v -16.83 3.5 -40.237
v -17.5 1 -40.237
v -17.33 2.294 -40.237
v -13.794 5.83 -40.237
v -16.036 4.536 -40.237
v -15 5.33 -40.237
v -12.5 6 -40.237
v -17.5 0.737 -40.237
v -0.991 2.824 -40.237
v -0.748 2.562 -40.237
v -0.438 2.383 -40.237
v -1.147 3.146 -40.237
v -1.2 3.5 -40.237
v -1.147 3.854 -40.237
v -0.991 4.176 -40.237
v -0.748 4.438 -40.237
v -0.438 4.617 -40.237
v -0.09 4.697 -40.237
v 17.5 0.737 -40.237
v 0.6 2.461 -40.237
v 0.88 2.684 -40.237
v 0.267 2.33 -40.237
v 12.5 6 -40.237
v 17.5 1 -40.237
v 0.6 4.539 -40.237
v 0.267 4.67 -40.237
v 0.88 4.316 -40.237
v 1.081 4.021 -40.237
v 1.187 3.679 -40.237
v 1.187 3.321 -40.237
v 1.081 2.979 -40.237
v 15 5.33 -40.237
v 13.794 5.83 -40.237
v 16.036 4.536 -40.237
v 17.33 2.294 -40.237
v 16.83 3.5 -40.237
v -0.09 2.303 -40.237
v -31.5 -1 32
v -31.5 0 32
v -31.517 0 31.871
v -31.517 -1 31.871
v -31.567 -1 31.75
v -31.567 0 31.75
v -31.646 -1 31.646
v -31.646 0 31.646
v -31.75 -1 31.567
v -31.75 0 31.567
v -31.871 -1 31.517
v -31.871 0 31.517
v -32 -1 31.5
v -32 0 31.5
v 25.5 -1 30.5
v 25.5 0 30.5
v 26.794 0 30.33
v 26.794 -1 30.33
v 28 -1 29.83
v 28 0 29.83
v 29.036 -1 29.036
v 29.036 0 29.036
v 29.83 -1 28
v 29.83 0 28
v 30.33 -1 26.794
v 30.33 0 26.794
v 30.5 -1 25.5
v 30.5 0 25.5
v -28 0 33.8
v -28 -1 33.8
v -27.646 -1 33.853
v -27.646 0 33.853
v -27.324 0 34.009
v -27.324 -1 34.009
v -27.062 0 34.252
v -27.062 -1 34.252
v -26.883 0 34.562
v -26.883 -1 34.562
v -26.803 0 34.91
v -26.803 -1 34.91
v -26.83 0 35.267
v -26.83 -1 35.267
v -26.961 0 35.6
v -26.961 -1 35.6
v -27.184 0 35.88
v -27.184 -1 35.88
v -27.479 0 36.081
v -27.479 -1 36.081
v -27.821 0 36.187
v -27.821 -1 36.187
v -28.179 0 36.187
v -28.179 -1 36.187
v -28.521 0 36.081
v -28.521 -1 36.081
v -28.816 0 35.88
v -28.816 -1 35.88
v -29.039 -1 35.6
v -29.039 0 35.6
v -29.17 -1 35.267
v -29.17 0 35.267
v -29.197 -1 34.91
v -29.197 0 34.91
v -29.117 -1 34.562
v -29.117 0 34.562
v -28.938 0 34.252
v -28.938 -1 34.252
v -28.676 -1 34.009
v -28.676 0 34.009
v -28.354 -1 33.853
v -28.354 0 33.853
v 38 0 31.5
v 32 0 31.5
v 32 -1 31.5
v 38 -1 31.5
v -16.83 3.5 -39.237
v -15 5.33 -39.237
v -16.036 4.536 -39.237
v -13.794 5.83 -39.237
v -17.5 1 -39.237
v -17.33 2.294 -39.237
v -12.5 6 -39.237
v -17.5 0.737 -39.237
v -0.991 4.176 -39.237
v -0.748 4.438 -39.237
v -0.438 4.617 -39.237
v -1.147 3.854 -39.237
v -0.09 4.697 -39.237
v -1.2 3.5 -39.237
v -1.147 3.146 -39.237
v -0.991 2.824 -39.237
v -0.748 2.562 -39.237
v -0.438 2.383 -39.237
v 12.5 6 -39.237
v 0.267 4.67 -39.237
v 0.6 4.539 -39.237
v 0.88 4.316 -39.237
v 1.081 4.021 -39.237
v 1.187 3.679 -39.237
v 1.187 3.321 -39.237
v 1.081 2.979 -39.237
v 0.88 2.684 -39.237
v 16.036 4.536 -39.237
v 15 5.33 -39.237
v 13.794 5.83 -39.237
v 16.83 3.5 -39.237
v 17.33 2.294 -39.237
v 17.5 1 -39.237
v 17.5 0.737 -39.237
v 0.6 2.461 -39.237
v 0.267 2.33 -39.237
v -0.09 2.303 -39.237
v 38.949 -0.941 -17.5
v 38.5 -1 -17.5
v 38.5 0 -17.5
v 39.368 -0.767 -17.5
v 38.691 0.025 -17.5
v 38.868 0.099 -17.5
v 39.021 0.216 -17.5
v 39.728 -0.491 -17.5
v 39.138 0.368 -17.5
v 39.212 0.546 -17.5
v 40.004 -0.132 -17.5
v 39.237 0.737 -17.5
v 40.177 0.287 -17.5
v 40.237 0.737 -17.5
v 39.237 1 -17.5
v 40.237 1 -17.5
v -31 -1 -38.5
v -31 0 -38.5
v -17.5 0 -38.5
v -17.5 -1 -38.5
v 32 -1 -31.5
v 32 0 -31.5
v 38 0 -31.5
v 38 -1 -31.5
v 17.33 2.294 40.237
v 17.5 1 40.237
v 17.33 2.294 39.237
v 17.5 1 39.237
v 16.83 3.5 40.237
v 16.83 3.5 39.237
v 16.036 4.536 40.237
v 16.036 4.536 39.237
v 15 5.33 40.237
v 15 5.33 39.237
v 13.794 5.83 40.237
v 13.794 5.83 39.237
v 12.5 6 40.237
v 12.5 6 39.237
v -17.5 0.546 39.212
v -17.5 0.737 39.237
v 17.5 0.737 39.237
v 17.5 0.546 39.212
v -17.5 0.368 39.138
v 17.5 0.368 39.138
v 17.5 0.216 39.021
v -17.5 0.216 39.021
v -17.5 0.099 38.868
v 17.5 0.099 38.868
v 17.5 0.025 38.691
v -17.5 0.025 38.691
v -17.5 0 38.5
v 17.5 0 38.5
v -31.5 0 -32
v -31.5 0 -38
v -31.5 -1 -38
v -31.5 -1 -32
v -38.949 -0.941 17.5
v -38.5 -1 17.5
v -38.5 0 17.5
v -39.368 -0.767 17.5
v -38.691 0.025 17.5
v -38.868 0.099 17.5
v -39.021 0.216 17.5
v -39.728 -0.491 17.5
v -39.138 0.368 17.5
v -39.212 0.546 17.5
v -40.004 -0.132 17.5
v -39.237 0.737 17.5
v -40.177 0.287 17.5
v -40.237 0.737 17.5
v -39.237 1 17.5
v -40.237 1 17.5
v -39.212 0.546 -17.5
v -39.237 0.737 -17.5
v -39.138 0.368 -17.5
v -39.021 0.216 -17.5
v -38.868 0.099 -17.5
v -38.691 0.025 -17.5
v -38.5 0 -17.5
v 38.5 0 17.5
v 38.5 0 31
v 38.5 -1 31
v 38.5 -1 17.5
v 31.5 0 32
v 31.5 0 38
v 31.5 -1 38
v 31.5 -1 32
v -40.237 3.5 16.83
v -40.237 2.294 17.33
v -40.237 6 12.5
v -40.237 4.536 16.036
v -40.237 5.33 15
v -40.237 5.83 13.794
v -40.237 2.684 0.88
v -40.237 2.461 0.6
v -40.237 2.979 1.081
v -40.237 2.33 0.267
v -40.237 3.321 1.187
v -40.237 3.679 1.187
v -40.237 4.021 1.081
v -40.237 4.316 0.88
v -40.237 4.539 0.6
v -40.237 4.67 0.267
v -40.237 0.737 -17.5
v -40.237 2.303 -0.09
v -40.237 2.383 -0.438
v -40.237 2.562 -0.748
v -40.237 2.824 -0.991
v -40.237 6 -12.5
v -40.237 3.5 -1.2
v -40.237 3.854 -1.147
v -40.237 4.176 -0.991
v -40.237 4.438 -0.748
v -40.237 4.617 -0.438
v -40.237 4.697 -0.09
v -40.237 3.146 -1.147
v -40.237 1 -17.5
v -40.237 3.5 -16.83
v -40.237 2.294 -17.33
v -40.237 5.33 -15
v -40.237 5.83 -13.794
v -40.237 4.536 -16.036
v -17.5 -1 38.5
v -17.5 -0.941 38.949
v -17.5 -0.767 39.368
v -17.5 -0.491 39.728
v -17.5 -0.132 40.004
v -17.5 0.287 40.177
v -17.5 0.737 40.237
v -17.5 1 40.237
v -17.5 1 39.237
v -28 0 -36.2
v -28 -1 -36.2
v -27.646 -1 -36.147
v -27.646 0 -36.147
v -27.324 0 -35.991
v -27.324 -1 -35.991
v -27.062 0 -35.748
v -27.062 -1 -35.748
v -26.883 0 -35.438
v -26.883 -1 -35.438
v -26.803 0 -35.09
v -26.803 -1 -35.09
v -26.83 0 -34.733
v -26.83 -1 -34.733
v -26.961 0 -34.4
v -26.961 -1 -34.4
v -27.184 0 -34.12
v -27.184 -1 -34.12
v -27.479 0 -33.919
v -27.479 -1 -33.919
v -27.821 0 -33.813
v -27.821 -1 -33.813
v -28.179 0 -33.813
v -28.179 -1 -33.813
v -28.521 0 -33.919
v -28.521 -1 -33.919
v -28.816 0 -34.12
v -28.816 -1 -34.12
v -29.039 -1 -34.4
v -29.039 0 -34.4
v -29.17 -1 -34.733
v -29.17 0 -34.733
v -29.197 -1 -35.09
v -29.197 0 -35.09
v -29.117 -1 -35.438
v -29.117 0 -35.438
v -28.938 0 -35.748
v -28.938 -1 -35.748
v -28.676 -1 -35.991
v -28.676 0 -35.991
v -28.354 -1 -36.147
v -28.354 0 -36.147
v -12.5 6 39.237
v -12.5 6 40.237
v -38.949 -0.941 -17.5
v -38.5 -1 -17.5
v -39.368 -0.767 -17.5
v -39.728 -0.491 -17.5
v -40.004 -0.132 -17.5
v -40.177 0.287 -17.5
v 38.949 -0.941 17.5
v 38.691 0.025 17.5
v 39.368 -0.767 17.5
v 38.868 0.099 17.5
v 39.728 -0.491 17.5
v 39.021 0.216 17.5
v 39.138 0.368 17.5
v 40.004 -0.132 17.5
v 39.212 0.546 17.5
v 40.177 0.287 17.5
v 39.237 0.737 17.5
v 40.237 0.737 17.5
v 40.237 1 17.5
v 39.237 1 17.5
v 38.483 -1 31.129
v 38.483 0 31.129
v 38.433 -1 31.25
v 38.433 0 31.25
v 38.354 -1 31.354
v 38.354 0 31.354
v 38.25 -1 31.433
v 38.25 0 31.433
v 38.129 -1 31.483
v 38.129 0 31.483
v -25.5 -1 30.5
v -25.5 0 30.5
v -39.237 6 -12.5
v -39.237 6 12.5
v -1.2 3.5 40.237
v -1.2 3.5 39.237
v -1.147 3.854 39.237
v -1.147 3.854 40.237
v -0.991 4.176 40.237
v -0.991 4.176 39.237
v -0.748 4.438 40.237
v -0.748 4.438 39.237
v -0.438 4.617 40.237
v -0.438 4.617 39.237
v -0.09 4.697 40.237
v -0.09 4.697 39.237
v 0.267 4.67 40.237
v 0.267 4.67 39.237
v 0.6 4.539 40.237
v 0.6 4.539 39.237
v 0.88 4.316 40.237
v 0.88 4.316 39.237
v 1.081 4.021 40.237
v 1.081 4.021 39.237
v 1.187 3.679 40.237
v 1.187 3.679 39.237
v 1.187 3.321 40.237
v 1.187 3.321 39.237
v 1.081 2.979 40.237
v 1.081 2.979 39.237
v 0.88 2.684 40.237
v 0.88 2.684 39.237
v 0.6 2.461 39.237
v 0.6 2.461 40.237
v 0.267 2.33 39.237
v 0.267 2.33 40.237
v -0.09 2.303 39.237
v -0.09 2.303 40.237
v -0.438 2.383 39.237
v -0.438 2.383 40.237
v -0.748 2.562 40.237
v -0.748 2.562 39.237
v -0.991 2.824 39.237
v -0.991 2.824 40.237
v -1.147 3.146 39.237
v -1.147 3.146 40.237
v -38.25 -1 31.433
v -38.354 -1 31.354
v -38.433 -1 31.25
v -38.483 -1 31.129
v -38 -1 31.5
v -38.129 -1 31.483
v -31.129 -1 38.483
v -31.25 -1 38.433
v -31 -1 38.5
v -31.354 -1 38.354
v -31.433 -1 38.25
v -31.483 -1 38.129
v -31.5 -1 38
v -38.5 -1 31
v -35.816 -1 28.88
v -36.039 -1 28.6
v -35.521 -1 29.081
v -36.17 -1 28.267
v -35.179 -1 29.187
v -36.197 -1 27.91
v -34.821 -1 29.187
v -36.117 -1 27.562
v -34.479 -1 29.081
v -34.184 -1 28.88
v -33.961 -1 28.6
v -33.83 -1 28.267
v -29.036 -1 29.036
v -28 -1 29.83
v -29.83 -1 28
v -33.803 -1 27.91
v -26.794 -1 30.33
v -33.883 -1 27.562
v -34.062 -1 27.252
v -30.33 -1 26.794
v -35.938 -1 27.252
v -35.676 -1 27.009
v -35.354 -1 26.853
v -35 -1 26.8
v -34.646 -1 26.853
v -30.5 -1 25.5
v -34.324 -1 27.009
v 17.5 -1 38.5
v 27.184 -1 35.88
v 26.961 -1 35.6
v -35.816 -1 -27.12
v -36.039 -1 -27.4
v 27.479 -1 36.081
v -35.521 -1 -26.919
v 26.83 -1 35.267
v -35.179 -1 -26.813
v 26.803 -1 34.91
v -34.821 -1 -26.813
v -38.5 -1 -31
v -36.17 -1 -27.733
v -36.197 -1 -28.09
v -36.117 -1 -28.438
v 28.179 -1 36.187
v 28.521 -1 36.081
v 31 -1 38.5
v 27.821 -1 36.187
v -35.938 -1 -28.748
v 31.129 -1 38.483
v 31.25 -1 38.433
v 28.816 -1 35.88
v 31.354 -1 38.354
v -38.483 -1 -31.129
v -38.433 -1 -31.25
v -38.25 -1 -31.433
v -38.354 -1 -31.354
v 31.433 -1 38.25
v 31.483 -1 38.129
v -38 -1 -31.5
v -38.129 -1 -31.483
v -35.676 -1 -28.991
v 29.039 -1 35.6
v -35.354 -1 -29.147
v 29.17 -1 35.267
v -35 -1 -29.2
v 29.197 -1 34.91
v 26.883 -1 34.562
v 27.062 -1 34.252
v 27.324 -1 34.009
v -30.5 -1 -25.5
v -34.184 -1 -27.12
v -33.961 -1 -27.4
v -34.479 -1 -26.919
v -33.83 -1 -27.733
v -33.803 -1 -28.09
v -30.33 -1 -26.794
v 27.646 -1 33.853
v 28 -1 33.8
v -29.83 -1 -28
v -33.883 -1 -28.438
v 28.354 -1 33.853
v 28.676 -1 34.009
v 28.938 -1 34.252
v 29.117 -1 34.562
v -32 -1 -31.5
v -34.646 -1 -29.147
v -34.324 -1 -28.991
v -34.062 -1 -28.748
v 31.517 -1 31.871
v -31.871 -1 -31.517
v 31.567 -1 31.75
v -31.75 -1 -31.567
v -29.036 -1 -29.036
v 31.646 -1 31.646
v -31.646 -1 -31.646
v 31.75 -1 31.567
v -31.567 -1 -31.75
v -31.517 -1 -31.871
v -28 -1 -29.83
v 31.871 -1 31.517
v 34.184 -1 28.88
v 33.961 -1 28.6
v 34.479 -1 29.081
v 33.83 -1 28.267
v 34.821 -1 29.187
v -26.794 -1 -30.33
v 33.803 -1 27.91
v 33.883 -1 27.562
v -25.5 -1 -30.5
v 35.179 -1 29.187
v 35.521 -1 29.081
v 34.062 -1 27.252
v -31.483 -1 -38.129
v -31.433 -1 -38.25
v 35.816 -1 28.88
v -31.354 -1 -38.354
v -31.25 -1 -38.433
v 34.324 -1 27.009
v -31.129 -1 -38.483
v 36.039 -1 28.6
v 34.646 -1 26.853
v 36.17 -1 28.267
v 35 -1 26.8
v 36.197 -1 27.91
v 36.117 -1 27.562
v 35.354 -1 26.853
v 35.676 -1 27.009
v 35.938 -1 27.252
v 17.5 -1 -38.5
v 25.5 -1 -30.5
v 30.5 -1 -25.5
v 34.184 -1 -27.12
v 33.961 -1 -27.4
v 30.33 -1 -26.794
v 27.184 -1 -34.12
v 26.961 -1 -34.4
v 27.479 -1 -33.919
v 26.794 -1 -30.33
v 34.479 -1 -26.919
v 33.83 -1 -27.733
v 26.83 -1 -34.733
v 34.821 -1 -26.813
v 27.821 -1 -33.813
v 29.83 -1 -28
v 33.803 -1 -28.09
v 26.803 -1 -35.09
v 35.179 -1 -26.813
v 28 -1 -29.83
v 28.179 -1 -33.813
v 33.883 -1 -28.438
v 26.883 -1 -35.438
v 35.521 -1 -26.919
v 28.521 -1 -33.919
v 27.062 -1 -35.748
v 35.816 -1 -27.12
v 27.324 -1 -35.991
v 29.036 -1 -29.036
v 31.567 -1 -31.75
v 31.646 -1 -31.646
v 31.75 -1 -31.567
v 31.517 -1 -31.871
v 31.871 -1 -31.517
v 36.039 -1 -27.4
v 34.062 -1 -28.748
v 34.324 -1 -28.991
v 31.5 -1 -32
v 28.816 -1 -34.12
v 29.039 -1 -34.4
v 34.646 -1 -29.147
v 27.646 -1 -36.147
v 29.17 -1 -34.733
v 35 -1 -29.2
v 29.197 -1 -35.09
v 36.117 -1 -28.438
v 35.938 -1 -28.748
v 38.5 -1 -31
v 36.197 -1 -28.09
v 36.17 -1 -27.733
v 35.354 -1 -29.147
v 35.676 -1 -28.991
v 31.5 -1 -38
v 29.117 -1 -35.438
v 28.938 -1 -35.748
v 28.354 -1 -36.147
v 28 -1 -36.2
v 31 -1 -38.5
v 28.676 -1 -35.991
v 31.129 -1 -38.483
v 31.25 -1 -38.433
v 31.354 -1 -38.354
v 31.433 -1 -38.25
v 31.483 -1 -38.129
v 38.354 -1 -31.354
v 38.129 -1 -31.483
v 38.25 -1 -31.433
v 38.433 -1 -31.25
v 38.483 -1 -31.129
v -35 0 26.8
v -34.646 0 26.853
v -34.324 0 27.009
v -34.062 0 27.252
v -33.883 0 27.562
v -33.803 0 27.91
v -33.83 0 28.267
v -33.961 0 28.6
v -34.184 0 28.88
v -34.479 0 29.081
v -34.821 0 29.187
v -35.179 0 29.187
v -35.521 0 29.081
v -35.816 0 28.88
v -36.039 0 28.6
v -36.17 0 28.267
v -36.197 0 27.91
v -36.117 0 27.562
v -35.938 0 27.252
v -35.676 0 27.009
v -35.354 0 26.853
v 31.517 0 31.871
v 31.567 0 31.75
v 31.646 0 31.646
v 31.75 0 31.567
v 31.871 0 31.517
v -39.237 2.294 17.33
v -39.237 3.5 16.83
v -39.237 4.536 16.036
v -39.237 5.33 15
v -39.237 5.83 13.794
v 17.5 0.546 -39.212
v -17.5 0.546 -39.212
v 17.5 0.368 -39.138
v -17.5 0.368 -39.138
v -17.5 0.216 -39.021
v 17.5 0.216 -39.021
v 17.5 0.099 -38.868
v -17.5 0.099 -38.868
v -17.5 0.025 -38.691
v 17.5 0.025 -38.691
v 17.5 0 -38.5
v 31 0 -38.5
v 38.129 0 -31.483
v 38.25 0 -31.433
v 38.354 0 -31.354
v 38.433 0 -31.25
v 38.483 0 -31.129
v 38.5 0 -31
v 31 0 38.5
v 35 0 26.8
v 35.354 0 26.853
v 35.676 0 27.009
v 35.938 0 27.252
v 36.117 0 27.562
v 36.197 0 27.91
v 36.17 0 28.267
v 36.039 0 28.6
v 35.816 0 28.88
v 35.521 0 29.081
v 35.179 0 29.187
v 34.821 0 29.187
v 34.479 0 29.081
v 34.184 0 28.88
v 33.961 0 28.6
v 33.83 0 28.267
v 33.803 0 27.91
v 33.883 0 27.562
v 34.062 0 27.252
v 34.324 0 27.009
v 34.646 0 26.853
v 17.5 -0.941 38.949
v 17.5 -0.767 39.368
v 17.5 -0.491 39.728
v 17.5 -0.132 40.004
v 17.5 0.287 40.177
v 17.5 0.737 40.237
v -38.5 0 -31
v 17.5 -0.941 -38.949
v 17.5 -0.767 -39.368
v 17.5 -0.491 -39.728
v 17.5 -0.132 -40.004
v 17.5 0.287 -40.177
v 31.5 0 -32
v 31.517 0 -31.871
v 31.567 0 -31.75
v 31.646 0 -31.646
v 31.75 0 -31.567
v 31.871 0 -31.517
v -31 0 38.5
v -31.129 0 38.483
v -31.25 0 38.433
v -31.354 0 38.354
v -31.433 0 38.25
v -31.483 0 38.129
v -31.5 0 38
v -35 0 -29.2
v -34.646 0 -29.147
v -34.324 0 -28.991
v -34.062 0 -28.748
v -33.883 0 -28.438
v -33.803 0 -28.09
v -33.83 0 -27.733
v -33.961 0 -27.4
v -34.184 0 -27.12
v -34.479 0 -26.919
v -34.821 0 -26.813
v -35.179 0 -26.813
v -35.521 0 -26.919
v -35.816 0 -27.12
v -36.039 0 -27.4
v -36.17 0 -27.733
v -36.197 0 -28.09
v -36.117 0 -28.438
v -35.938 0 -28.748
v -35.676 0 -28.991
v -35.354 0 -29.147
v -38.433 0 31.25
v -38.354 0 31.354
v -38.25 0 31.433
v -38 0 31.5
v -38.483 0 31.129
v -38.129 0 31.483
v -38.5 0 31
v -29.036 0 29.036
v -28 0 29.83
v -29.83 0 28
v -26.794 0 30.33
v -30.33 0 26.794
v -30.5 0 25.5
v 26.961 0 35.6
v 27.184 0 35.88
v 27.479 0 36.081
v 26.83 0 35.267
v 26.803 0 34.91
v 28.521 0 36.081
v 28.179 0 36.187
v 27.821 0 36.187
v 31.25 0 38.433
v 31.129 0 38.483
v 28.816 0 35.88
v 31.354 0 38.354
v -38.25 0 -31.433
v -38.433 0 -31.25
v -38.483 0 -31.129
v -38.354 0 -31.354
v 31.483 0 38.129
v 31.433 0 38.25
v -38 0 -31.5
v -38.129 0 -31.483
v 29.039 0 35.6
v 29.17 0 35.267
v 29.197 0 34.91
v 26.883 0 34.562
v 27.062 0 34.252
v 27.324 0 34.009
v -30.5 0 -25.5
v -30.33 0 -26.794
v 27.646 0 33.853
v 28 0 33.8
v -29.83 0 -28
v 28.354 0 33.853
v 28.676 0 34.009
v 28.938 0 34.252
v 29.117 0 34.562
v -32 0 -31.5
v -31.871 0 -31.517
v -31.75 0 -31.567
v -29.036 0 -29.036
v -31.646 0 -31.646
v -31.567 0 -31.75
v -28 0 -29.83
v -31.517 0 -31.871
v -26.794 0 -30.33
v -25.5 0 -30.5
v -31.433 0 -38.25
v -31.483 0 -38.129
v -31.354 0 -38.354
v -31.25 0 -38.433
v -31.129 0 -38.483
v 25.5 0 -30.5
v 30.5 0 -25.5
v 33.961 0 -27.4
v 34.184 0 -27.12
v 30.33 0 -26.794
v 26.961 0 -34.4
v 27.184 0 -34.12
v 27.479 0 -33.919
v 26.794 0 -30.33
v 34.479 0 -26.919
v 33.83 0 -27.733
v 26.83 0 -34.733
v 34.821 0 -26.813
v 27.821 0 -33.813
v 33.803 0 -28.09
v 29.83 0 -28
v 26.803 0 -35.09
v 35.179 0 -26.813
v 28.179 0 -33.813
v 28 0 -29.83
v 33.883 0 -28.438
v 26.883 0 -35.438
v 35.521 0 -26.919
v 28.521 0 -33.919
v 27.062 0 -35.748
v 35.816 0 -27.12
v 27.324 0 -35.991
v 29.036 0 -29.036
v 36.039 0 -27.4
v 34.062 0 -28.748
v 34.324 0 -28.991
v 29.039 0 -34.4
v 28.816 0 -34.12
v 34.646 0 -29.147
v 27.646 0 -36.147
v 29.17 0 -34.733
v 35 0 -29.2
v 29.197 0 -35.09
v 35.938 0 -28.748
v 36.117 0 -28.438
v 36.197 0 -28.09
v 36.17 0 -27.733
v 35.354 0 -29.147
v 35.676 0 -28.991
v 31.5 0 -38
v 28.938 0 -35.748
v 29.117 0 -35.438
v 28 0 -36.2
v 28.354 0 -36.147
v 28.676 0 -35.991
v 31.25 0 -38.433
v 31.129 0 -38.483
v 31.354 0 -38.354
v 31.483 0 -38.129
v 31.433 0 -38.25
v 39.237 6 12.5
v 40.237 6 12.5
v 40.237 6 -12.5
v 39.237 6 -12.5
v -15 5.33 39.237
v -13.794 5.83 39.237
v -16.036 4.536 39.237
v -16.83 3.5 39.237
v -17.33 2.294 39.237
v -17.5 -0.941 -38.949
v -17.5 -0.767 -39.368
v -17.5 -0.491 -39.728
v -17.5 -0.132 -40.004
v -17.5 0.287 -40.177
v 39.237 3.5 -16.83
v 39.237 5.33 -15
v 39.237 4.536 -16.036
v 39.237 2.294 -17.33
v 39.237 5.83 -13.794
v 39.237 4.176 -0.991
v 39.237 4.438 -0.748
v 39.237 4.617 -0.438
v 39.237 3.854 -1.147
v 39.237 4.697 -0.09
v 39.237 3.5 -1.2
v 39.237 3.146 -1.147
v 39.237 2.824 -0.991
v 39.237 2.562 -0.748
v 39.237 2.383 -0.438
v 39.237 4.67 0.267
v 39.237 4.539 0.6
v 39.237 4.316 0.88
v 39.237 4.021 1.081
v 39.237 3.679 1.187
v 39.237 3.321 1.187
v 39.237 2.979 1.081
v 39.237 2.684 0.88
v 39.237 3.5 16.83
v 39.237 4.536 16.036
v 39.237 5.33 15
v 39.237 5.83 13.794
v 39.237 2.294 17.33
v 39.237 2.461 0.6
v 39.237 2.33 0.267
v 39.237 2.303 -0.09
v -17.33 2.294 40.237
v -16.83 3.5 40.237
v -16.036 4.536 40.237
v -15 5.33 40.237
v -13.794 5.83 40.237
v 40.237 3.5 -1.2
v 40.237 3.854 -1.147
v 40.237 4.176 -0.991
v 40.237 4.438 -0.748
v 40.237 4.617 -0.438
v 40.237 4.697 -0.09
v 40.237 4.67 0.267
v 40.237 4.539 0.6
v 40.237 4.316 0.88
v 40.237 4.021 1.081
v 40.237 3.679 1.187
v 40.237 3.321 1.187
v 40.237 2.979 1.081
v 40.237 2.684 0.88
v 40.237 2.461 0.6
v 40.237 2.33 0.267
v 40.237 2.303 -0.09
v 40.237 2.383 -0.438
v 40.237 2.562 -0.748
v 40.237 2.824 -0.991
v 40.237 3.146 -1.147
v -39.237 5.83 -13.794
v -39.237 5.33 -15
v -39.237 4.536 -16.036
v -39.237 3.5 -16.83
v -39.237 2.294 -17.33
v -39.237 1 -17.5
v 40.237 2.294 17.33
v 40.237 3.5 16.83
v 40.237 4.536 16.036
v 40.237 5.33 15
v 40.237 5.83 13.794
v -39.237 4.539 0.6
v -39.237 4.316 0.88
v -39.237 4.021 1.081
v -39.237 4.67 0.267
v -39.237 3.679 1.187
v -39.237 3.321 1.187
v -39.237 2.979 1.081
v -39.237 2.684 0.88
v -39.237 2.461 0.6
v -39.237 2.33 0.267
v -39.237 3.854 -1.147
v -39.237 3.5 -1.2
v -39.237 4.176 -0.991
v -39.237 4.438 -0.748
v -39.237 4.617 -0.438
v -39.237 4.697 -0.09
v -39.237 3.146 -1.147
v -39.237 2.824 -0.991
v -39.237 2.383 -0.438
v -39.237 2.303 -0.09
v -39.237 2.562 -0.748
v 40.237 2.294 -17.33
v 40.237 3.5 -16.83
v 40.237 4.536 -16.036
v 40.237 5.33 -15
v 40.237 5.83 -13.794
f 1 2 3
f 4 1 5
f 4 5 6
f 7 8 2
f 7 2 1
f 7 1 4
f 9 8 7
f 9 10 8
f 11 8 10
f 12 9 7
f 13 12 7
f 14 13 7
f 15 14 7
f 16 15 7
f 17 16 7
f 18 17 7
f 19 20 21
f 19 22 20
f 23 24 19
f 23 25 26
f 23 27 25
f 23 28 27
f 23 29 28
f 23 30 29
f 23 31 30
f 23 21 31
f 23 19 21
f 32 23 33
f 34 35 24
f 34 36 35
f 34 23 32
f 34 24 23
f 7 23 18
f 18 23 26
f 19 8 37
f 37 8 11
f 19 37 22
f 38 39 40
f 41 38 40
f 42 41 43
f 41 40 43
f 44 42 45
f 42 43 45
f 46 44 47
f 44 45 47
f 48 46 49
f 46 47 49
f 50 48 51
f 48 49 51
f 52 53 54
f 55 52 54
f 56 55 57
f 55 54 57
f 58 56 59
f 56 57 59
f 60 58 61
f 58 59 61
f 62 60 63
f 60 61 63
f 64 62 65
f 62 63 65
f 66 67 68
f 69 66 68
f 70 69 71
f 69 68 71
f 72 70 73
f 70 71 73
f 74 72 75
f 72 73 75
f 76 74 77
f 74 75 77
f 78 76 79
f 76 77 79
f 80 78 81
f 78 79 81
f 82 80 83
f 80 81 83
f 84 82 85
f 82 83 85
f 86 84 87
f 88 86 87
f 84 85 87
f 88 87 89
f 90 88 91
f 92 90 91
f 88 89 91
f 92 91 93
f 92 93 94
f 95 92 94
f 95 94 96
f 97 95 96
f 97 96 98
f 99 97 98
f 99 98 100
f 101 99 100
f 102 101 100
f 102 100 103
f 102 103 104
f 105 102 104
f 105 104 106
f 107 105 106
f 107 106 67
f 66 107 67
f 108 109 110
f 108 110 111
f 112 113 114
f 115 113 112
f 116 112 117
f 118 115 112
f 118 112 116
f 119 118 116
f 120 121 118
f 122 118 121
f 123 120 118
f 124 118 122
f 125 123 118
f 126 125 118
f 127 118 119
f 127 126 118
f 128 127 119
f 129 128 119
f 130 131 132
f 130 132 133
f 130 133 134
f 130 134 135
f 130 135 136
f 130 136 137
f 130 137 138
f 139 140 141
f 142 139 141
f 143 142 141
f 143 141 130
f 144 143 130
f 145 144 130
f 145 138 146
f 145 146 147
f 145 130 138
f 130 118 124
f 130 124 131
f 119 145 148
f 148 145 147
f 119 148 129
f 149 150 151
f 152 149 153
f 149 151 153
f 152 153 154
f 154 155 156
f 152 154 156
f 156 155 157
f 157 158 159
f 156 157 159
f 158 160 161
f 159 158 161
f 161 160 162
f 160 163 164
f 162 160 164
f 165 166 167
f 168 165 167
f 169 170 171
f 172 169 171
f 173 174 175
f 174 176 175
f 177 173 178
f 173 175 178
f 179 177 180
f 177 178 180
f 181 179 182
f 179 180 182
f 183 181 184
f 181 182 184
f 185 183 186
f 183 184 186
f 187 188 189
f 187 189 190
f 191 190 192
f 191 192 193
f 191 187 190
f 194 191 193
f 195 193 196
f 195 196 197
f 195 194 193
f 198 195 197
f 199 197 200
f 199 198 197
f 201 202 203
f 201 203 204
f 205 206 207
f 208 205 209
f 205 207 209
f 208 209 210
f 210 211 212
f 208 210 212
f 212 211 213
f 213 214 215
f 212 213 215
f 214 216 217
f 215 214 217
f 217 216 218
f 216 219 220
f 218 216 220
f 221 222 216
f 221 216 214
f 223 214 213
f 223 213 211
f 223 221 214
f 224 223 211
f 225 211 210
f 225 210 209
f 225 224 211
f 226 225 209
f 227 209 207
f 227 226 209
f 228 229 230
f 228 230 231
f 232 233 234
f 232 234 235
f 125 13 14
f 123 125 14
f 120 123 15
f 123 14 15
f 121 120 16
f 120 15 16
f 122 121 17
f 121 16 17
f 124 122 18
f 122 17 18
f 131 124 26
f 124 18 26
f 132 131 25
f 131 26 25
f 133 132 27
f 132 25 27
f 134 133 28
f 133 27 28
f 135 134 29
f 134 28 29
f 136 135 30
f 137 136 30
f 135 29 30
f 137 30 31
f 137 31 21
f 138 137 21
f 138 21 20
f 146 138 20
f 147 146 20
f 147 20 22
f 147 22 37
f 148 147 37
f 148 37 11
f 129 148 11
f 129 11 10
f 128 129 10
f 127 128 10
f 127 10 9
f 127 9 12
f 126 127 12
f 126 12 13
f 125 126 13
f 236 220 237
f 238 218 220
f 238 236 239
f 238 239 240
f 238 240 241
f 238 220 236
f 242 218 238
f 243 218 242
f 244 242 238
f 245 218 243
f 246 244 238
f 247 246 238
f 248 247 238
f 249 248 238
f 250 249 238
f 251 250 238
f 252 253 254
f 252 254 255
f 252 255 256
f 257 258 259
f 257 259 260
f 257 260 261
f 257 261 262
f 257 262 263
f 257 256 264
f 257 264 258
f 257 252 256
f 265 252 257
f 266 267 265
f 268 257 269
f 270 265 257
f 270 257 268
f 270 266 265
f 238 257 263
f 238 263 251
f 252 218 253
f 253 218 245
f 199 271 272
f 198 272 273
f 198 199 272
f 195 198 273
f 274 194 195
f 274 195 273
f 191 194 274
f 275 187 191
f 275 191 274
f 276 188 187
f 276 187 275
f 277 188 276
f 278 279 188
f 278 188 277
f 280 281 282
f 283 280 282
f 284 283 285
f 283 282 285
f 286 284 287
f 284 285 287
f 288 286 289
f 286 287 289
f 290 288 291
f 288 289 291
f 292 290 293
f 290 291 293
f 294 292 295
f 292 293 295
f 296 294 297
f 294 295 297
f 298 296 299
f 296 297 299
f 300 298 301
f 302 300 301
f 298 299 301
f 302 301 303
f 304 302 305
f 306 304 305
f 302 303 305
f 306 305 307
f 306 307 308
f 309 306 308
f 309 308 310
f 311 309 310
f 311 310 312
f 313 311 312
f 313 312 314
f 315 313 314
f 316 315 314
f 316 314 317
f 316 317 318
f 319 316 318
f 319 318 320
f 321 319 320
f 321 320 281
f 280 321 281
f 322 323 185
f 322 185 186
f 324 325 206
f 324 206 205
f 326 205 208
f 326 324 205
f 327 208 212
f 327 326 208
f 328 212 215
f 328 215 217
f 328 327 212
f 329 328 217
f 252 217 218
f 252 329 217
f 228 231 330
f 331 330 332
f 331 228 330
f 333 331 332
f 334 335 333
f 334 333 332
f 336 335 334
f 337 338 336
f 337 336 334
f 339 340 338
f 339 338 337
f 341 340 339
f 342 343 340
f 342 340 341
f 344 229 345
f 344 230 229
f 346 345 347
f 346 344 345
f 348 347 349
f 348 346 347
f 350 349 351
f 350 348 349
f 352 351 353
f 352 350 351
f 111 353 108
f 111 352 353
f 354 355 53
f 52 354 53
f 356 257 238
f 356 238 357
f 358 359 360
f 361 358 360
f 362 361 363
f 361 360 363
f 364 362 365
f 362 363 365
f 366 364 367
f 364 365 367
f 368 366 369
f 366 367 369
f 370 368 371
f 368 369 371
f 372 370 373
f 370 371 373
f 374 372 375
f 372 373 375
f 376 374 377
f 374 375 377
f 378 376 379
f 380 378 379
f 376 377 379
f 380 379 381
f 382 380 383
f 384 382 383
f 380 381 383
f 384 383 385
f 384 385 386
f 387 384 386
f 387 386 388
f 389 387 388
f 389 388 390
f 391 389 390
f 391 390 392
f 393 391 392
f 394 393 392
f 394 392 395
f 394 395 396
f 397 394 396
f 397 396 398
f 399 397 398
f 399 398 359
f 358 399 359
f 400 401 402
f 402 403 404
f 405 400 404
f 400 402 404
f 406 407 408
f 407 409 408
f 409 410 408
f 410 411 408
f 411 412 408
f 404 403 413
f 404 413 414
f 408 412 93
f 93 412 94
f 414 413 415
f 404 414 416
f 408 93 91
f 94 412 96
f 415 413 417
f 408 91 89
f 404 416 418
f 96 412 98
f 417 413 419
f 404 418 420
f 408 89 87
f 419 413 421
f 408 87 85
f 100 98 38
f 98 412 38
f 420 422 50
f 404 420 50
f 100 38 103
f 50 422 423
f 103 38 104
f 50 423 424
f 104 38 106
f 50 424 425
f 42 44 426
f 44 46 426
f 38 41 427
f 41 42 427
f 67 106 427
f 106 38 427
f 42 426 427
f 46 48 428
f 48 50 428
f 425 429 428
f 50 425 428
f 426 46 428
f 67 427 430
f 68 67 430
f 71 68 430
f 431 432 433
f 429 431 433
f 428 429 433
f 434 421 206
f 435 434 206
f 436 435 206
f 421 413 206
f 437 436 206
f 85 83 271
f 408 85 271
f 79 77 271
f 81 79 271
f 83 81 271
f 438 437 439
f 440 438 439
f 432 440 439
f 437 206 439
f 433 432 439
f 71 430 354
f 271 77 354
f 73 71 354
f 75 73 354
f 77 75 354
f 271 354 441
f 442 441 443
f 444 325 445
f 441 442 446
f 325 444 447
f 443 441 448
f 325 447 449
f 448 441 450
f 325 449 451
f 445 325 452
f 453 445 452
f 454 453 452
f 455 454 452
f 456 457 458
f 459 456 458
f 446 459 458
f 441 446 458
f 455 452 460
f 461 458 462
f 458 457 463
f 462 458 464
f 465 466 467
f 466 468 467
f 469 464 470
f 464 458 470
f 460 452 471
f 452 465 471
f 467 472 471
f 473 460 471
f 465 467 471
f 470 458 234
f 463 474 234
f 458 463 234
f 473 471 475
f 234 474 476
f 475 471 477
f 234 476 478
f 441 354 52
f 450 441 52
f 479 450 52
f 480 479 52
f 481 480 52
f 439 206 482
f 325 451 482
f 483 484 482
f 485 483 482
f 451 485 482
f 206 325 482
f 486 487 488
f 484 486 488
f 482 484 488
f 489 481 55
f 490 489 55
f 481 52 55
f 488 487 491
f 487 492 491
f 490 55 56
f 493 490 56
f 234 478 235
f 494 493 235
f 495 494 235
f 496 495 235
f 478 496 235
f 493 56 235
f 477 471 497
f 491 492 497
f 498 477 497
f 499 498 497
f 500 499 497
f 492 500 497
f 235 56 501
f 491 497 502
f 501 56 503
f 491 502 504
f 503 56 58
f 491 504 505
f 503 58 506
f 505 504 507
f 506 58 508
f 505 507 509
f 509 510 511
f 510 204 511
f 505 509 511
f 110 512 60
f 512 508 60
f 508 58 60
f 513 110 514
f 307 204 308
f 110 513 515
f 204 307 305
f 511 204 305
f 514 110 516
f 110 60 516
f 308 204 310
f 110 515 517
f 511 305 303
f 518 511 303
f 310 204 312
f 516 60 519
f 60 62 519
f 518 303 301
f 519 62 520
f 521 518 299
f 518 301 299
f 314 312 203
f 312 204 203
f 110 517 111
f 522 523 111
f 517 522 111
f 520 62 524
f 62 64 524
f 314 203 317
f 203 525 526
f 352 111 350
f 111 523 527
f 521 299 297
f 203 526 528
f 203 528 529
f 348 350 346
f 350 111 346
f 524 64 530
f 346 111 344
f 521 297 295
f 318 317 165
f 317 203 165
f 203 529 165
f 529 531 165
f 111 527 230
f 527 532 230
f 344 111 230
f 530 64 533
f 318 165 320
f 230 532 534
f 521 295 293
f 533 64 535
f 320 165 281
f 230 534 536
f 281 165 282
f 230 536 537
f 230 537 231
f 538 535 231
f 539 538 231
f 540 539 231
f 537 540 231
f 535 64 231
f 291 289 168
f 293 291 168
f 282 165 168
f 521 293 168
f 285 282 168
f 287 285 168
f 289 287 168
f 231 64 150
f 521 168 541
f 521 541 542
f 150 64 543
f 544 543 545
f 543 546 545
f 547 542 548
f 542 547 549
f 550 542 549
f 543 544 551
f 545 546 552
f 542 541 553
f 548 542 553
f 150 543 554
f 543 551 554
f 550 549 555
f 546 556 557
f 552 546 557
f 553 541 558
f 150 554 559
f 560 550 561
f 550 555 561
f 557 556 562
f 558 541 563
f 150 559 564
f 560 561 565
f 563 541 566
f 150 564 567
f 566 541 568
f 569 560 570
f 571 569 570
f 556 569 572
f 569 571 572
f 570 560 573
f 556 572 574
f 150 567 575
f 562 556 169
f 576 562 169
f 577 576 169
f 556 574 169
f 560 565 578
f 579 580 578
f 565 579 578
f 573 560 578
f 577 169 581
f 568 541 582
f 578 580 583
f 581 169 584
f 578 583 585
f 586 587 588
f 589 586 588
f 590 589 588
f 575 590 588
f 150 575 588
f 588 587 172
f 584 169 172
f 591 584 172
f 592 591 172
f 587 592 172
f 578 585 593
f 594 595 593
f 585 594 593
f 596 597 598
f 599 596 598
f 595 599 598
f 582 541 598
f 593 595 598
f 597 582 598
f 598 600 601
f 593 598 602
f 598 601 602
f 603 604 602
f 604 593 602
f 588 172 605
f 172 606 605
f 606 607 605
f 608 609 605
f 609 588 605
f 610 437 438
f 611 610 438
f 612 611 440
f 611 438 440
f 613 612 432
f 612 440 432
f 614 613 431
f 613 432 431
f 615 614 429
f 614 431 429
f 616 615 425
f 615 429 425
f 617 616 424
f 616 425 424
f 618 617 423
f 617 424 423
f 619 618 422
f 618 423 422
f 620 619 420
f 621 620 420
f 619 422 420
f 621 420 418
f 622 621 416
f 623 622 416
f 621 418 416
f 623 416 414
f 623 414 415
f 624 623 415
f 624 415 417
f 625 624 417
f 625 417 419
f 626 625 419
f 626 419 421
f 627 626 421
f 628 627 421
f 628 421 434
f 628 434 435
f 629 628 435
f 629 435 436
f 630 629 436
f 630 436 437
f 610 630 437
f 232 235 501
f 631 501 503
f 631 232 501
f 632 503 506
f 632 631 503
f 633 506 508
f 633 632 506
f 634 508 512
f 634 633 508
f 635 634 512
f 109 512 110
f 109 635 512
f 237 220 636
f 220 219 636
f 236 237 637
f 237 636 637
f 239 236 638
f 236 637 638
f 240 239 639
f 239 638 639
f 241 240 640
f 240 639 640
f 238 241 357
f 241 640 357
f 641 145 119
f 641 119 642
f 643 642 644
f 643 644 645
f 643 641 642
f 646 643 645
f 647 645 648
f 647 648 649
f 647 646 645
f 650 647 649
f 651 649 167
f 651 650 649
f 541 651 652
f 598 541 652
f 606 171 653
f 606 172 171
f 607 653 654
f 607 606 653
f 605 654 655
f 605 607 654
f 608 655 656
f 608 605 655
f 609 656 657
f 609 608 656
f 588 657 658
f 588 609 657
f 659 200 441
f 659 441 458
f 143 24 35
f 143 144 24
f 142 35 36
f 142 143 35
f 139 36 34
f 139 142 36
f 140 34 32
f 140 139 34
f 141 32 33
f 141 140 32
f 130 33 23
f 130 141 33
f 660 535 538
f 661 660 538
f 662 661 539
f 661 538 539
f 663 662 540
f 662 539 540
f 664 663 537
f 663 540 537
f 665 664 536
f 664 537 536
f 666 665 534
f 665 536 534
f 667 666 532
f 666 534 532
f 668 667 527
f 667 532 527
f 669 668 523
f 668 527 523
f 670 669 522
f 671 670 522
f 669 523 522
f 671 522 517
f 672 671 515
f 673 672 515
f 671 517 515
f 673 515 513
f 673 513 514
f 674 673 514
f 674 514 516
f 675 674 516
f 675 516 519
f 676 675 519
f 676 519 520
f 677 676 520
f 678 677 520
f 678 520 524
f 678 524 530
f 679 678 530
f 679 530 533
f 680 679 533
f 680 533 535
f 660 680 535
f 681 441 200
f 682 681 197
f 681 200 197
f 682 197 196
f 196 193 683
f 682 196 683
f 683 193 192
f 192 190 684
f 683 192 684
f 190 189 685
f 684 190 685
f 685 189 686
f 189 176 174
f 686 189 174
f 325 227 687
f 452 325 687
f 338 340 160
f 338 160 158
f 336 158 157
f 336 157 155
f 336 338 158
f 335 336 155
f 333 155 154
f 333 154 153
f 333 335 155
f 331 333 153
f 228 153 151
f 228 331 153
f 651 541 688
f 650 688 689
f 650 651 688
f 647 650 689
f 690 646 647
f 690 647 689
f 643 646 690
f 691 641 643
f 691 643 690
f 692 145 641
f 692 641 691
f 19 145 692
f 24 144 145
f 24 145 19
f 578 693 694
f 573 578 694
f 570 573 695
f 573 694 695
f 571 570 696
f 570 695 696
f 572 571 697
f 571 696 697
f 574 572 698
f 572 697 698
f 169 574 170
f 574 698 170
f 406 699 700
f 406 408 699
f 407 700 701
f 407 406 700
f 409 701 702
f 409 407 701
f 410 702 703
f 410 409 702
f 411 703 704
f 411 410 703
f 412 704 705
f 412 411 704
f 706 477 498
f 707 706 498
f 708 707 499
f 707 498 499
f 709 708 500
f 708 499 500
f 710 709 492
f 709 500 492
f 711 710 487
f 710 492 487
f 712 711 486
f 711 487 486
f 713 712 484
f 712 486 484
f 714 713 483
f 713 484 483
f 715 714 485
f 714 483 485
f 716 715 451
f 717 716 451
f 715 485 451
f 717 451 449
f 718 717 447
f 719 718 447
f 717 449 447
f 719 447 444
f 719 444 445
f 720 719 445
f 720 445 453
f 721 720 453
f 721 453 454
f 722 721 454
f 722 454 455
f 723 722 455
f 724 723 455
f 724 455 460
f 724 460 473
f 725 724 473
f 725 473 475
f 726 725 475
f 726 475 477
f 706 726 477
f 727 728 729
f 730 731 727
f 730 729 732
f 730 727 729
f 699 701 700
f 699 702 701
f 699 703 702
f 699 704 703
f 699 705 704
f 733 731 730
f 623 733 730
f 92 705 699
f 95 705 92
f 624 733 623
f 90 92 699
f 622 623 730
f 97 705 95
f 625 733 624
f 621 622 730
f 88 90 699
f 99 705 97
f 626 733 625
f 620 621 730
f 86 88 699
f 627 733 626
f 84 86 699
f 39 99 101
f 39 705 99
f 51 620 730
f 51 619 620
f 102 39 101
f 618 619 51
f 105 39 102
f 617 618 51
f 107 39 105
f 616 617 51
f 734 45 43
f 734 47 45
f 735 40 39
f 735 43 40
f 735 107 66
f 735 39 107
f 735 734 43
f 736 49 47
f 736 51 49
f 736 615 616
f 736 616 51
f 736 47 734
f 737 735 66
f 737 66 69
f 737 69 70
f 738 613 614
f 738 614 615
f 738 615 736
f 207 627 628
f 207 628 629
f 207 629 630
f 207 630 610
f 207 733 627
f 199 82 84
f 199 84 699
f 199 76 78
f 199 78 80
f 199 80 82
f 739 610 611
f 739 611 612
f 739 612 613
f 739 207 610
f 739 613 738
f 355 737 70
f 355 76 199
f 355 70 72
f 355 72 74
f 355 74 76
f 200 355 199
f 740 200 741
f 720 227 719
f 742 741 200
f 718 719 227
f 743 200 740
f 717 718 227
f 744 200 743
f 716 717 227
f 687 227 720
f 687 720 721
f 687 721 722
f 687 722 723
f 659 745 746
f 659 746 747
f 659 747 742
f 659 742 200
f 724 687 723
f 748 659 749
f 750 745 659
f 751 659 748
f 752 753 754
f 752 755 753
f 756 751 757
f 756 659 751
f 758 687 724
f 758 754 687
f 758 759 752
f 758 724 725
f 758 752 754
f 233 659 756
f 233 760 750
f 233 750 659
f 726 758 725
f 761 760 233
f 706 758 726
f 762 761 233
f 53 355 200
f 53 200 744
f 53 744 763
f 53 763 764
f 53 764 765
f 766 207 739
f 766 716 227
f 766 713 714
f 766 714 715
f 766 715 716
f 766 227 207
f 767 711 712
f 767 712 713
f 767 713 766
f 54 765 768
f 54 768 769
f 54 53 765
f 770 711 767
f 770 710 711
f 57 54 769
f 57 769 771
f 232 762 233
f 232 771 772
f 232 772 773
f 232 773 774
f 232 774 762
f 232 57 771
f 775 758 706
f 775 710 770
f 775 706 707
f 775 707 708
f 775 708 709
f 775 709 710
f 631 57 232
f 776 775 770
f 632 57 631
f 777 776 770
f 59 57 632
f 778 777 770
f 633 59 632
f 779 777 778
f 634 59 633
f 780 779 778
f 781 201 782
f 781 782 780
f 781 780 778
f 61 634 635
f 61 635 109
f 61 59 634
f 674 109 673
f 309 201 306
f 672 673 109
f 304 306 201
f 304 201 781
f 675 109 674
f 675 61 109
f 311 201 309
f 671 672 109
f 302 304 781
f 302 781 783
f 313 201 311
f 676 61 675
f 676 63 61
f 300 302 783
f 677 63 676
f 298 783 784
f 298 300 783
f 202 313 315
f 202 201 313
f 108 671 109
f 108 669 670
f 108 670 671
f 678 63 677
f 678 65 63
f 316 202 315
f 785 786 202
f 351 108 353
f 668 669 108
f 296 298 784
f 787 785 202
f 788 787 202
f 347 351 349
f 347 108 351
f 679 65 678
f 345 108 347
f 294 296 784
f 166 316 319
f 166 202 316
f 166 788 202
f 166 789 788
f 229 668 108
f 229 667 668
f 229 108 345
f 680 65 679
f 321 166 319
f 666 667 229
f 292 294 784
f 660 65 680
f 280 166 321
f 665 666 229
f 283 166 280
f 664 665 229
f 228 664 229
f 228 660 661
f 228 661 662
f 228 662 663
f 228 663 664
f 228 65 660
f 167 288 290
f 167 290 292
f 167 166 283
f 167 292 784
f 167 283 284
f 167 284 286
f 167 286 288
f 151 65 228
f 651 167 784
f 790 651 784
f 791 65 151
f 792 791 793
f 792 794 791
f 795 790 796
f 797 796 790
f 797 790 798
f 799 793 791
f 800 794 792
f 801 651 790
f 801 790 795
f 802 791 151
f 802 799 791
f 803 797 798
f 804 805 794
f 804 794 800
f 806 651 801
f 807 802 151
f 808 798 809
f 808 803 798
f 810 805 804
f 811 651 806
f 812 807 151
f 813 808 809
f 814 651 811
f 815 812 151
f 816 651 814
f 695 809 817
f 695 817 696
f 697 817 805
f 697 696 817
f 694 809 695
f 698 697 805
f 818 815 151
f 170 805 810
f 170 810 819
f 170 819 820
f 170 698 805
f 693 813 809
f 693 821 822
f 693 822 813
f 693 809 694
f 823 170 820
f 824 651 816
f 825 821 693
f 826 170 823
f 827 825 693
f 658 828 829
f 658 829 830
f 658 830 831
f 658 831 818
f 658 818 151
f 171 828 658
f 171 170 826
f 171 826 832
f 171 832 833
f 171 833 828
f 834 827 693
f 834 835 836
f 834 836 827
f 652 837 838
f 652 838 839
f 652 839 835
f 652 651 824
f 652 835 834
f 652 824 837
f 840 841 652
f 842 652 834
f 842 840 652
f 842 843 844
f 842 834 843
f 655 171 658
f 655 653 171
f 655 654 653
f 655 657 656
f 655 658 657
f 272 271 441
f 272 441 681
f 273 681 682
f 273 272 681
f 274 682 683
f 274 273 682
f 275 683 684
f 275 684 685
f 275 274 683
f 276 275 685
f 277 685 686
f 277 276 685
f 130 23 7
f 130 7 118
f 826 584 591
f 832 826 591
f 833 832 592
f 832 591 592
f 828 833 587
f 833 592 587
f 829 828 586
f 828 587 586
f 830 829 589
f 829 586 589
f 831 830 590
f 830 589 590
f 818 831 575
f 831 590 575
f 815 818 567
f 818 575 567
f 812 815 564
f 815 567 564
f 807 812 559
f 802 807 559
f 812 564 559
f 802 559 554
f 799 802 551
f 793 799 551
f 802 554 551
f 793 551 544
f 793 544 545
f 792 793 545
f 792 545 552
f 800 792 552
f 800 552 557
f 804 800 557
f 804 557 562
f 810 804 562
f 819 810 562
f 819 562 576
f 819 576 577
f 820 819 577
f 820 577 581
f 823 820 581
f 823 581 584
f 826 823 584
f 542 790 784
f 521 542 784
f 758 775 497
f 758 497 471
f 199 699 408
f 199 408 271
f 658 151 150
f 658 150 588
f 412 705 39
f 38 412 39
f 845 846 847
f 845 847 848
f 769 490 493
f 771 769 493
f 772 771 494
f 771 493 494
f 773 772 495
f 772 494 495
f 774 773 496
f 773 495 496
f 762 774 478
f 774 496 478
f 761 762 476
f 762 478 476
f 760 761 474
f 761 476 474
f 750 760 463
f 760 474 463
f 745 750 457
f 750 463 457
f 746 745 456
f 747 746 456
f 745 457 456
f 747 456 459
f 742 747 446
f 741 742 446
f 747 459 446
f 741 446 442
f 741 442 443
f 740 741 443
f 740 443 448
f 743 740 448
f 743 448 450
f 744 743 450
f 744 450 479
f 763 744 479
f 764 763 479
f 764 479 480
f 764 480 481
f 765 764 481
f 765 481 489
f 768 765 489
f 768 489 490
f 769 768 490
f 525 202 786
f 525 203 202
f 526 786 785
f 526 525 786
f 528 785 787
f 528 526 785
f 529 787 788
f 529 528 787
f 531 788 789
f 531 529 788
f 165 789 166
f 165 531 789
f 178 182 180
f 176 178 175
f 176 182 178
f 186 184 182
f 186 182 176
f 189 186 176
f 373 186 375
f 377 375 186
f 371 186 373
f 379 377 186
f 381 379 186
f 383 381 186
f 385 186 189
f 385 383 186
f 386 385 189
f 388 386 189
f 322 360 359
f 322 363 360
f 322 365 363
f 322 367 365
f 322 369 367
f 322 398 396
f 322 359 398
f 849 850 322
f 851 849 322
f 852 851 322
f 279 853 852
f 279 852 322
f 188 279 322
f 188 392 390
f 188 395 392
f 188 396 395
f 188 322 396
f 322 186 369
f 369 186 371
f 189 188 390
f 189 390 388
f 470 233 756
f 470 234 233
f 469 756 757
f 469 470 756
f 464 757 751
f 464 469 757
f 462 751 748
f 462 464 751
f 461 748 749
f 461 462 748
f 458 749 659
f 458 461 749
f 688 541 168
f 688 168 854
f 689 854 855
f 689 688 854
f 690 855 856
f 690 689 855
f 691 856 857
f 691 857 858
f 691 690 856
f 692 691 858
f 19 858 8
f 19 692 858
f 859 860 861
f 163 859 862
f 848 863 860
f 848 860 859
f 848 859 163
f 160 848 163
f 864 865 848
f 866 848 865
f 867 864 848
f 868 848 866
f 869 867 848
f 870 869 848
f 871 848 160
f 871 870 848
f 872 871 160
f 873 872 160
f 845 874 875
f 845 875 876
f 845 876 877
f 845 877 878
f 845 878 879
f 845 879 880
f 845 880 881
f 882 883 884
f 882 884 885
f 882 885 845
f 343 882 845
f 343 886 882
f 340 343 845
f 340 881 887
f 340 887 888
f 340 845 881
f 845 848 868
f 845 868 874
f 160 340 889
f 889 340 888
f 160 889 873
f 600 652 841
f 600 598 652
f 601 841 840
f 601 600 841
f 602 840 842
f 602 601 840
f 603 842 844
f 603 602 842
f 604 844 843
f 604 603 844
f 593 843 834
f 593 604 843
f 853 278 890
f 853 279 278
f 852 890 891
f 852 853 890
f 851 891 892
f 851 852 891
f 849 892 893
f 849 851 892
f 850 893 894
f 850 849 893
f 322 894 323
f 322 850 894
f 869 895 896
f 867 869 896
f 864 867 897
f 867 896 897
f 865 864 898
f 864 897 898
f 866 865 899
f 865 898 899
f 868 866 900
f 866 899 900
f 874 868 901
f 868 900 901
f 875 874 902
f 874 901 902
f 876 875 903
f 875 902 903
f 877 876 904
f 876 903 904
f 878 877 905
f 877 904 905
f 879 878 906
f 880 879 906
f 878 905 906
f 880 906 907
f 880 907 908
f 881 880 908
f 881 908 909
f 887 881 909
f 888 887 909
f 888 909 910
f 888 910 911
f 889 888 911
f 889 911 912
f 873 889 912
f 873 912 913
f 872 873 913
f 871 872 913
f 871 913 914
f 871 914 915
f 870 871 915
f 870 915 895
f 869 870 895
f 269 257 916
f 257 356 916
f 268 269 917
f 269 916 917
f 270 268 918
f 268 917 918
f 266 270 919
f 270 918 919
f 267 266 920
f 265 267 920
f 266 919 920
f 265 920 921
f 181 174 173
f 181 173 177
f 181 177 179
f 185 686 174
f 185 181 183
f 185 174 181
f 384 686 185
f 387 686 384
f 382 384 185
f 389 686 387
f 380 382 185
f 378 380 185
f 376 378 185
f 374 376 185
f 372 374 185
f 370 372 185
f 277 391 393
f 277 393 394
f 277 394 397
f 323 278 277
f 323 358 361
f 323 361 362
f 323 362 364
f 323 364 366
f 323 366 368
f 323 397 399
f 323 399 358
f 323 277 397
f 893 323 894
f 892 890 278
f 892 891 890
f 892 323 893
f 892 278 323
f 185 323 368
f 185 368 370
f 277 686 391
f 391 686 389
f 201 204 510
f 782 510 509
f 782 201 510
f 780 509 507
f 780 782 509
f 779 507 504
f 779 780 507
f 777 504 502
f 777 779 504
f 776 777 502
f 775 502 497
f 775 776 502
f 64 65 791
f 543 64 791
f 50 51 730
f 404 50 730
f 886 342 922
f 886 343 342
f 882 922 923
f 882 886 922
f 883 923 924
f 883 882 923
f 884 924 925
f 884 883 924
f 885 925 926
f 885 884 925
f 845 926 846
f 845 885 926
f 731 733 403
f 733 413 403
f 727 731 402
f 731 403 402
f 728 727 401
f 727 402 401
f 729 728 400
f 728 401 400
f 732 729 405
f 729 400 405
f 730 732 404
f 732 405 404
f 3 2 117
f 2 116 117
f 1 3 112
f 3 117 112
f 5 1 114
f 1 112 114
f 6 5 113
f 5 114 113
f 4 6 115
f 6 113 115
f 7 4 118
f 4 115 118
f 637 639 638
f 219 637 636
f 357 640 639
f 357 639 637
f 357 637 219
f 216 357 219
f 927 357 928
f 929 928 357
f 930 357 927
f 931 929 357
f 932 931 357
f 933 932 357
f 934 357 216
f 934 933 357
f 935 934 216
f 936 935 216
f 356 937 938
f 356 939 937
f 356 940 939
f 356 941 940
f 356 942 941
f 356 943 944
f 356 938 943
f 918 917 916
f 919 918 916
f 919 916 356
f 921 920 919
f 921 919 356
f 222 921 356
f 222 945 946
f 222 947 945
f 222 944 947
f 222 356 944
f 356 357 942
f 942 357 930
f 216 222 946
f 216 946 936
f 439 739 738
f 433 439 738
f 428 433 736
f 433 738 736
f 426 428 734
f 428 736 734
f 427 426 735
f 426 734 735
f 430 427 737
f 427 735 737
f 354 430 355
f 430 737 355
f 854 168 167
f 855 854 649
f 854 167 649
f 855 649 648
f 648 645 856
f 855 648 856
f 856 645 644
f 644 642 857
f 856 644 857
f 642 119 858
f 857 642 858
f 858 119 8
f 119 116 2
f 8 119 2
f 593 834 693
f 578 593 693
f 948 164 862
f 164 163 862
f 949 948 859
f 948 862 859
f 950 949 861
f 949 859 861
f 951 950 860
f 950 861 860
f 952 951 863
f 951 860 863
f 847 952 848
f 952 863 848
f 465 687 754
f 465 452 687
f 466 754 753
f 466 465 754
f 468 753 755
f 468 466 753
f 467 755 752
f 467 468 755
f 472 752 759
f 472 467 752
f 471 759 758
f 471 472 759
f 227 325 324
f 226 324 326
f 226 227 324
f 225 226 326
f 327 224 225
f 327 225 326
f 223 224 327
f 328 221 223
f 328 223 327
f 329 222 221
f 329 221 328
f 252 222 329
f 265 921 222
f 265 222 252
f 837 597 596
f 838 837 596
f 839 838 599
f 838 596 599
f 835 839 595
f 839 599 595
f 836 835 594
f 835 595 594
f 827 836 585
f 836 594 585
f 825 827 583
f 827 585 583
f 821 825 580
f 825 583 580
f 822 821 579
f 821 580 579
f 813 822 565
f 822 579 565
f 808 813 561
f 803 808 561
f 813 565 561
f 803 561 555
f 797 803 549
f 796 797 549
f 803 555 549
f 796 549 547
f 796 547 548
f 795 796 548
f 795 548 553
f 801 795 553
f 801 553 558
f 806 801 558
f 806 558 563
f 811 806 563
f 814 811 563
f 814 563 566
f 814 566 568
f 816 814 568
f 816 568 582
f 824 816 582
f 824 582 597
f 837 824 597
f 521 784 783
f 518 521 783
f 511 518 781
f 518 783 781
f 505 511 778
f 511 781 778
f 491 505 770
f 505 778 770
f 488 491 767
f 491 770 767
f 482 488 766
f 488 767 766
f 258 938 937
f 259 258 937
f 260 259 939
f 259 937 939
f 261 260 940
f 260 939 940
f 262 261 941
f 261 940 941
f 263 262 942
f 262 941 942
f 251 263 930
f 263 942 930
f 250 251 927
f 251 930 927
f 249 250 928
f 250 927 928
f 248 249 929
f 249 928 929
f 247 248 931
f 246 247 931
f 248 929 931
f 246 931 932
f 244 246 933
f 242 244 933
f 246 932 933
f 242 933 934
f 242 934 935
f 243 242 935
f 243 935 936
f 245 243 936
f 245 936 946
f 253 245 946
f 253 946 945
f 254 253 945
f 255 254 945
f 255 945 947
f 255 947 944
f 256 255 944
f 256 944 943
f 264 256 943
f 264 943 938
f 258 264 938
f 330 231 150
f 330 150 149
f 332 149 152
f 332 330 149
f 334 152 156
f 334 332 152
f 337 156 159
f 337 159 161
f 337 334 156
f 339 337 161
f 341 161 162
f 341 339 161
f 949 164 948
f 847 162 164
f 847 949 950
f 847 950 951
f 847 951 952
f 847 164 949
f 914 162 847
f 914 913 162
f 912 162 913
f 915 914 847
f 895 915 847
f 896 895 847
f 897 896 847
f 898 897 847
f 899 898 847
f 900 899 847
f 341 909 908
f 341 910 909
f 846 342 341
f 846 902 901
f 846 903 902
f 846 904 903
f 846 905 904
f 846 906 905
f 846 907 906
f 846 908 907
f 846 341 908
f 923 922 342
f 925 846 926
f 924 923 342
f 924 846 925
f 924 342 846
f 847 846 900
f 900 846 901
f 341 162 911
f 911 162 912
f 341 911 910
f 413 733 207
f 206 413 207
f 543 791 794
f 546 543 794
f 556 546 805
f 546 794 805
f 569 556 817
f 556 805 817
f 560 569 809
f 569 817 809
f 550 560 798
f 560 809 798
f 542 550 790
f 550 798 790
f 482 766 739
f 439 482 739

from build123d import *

# Parameters (mm, degrees)
SKETCH1_W          = 77
SKETCH1_H          = 77
BASE_FLANGE1_DEPTH = 1
EDGE_FLANGE1_DEPTH = 35
EDGE_FLANGE2_DEPTH = 35
EDGE_FLANGE3_DEPTH = 35
EDGE_FLANGE4_DEPTH = 35
CUT_EXTRUDE1_DEPTH = 58.218598018
FILLET1_R          = 0.5
FILLET2_R          = 5
M2_HOLE1_AA_D      = 2.4
M2_HOLE2_AB_D      = 2.4
M2_HOLE3_AC_D      = 2.4


# Sheet-metal steps are written as plain solids
with BuildPart() as part:
    # Sketch1 → Base-Flange1 (new body)
    with BuildSketch(Plane(origin=(0, 0, 0), x_dir=(1, 0, 0), z_dir=(0, 1, 0))):
        Rectangle(SKETCH1_W, SKETCH1_H)
    extrude(amount=-BASE_FLANGE1_DEPTH)

    # Edge-Flange1 section (across the edge) → Edge-Flange1 (add)
    with BuildSketch(Plane(origin=(-17.5, 0, 39.2366), x_dir=(0, 0, -1), z_dir=(1, 0, 0))):
        with BuildLine():
            Line((-1, 0.7366), (-1, 6))
            Line((-1, 6), (0, 6))
            Line((0, 6), (0, 0.7366))
            ThreePointArc((0, 0.7366), (0.215745145, 0.215745145), (0.7366, 0))
            Line((0.7366, 0), (0.7366, -1))
            ThreePointArc((0.7366, -1), (-0.491361636, -0.491361636), (-1, 0.7366))
        make_face()
    extrude(amount=EDGE_FLANGE1_DEPTH)

    # Edge-Flange2 section (across the edge) → Edge-Flange2 (add)
    with BuildSketch(Plane(origin=(17.5, 0, -39.2366), x_dir=(0, 0, 1), z_dir=(-1, 0, 0))):
        with BuildLine():
            Line((-1, 0.7366), (-1, 6))
            Line((-1, 6), (0, 6))
            Line((0, 6), (0, 0.7366))
            ThreePointArc((0, 0.7366), (0.215745145, 0.215745145), (0.7366, 0))
            Line((0.7366, 0), (0.7366, -1))
            ThreePointArc((0.7366, -1), (-0.491361636, -0.491361636), (-1, 0.7366))
        make_face()
    extrude(amount=EDGE_FLANGE2_DEPTH)

    # Edge-Flange3 section (across the edge) → Edge-Flange3 (add)
    with BuildSketch(Plane(origin=(-39.2366, 0, -17.5), x_dir=(1, 0, 0), z_dir=(0, 0, 1))):
        with BuildLine():
            Line((-1, 0.7366), (-1, 6))
            Line((-1, 6), (0, 6))
            Line((0, 6), (0, 0.7366))
            ThreePointArc((0, 0.7366), (0.215745145, 0.215745145), (0.7366, 0))
            Line((0.7366, 0), (0.7366, -1))
            ThreePointArc((0.7366, -1), (-0.491361636, -0.491361636), (-1, 0.7366))
        make_face()
    extrude(amount=EDGE_FLANGE3_DEPTH)

    # Edge-Flange4 section (across the edge) → Edge-Flange4 (add)
    with BuildSketch(Plane(origin=(39.2366, 0, 17.5), x_dir=(-1, 0, 0), z_dir=(0, 0, -1))):
        with BuildLine():
            Line((-1, 0.7366), (-1, 6))
            Line((-1, 6), (0, 6))
            Line((0, 6), (0, 0.7366))
            ThreePointArc((0, 0.7366), (0.215745145, 0.215745145), (0.7366, 0))
            Line((0.7366, 0), (0.7366, -1))
            ThreePointArc((0.7366, -1), (-0.491361636, -0.491361636), (-1, 0.7366))
        make_face()
    extrude(amount=EDGE_FLANGE4_DEPTH)

    # Sketch18 → Cut-Extrude1 (cut, through all)
    with BuildSketch(Plane(origin=(0, 0, 0), x_dir=(1, 0, 0), z_dir=(0, 1, 0))):
        with BuildLine():
            Line((-25.5, -30.5), (25.5, -30.5))
            ThreePointArc((25.5, -30.5), (29.035533906, -29.035533906), (30.5, -25.5))
            Line((30.5, -25.5), (30.5, 25.5))
            ThreePointArc((30.5, 25.5), (29.035533906, 29.035533906), (25.5, 30.5))
            Line((25.5, 30.5), (-25.5, 30.5))
            ThreePointArc((-25.5, 30.5), (-29.035533906, 29.035533906), (-30.5, 25.5))
            Line((-30.5, 25.5), (-30.5, -25.5))
            ThreePointArc((-30.5, -25.5), (-29.035533906, -29.035533906), (-25.5, -30.5))
        make_face()
        with BuildLine():
            Line((-38.5, 38.5), (-31.5, 38.5))
            Line((-31.5, 38.5), (-31.5, 32))
            ThreePointArc((-31.5, 32), (-31.646446609, 31.646446609), (-32, 31.5))
            Line((-32, 31.5), (-38.5, 31.5))
            Line((-38.5, 31.5), (-38.5, 38.5))
        make_face()
        with BuildLine():
            Line((38.5, 38.5), (31.5, 38.5))
            Line((31.5, 38.5), (31.5, 32))
            ThreePointArc((31.5, 32), (31.646446609, 31.646446609), (32, 31.5))
            Line((32, 31.5), (38.5, 31.5))
            Line((38.5, 31.5), (38.5, 38.5))
        make_face()
        with BuildLine():
            Line((38.5, -38.5), (31.5, -38.5))
            Line((31.5, -38.5), (31.5, -32))
            ThreePointArc((31.5, -32), (31.646446609, -31.646446609), (32, -31.5))
            Line((32, -31.5), (38.5, -31.5))
            Line((38.5, -31.5), (38.5, -38.5))
        make_face()
        with BuildLine():
            Line((-38.5, -38.5), (-31.5, -38.5))
            Line((-31.5, -38.5), (-31.5, -32))
            ThreePointArc((-31.5, -32), (-31.646446609, -31.646446609), (-32, -31.5))
            Line((-32, -31.5), (-38.5, -31.5))
            Line((-38.5, -31.5), (-38.5, -38.5))
        make_face()
    extrude(amount=-CUT_EXTRUDE1_DEPTH, mode=Mode.SUBTRACT)

    # Fillet1
    fillet1_edges = [part.edges().sort_by_distance(p)[0] for p in [
        (31.5, -0.5, -38.5),
        (38.5, -0.5, -31.5),
        (38.5, -0.5, 31.5),
        (31.5, -0.5, 38.5),
        (-31.5, -0.5, 38.5),
        (-38.5, -0.5, 31.5),
        (-38.5, -0.5, -31.5),
        (-31.5, -0.5, -38.5),
    ]]
    fillet(fillet1_edges, radius=FILLET1_R)

    # Fillet2
    fillet2_edges = [part.edges().sort_by_distance(p)[0] for p in [
        (39.7366, 6, 17.5),
        (39.7366, 6, -17.5),
        (-17.5, 6, 39.7366),
        (17.5, 6, 39.7366),
        (17.5, 6, -39.7366),
        (-17.5, 6, -39.7366),
        (-39.7366, 6, -17.5),
        (-39.7366, 6, 17.5),
    ]]
    fillet(fillet2_edges, radius=FILLET2_R)

    # M2 Hole1 - AA (through all)
    with Locations(Plane(origin=(-35, 0, -28), x_dir=(0, 0, 1), z_dir=(0, 1, 0))):
        with Locations((0, 0), (-7, 7), (-7, 63), (0, 70), (56, 0), (63, 7), (63, 63), (56, 70)):
            Hole(M2_HOLE1_AA_D / 2)

    # M2 Hole2 - AB (through all)
    with Locations(Plane.ZY.offset(40.2366)):
        with Locations((0, 3.5)):
            Hole(M2_HOLE2_AB_D / 2)

    # M2 Hole3 - AC (through all)
    with Locations(Plane.XY.offset(40.2366)):
        with Locations((0, 3.5)):
            Hole(M2_HOLE3_AC_D / 2)


solid = part.part
